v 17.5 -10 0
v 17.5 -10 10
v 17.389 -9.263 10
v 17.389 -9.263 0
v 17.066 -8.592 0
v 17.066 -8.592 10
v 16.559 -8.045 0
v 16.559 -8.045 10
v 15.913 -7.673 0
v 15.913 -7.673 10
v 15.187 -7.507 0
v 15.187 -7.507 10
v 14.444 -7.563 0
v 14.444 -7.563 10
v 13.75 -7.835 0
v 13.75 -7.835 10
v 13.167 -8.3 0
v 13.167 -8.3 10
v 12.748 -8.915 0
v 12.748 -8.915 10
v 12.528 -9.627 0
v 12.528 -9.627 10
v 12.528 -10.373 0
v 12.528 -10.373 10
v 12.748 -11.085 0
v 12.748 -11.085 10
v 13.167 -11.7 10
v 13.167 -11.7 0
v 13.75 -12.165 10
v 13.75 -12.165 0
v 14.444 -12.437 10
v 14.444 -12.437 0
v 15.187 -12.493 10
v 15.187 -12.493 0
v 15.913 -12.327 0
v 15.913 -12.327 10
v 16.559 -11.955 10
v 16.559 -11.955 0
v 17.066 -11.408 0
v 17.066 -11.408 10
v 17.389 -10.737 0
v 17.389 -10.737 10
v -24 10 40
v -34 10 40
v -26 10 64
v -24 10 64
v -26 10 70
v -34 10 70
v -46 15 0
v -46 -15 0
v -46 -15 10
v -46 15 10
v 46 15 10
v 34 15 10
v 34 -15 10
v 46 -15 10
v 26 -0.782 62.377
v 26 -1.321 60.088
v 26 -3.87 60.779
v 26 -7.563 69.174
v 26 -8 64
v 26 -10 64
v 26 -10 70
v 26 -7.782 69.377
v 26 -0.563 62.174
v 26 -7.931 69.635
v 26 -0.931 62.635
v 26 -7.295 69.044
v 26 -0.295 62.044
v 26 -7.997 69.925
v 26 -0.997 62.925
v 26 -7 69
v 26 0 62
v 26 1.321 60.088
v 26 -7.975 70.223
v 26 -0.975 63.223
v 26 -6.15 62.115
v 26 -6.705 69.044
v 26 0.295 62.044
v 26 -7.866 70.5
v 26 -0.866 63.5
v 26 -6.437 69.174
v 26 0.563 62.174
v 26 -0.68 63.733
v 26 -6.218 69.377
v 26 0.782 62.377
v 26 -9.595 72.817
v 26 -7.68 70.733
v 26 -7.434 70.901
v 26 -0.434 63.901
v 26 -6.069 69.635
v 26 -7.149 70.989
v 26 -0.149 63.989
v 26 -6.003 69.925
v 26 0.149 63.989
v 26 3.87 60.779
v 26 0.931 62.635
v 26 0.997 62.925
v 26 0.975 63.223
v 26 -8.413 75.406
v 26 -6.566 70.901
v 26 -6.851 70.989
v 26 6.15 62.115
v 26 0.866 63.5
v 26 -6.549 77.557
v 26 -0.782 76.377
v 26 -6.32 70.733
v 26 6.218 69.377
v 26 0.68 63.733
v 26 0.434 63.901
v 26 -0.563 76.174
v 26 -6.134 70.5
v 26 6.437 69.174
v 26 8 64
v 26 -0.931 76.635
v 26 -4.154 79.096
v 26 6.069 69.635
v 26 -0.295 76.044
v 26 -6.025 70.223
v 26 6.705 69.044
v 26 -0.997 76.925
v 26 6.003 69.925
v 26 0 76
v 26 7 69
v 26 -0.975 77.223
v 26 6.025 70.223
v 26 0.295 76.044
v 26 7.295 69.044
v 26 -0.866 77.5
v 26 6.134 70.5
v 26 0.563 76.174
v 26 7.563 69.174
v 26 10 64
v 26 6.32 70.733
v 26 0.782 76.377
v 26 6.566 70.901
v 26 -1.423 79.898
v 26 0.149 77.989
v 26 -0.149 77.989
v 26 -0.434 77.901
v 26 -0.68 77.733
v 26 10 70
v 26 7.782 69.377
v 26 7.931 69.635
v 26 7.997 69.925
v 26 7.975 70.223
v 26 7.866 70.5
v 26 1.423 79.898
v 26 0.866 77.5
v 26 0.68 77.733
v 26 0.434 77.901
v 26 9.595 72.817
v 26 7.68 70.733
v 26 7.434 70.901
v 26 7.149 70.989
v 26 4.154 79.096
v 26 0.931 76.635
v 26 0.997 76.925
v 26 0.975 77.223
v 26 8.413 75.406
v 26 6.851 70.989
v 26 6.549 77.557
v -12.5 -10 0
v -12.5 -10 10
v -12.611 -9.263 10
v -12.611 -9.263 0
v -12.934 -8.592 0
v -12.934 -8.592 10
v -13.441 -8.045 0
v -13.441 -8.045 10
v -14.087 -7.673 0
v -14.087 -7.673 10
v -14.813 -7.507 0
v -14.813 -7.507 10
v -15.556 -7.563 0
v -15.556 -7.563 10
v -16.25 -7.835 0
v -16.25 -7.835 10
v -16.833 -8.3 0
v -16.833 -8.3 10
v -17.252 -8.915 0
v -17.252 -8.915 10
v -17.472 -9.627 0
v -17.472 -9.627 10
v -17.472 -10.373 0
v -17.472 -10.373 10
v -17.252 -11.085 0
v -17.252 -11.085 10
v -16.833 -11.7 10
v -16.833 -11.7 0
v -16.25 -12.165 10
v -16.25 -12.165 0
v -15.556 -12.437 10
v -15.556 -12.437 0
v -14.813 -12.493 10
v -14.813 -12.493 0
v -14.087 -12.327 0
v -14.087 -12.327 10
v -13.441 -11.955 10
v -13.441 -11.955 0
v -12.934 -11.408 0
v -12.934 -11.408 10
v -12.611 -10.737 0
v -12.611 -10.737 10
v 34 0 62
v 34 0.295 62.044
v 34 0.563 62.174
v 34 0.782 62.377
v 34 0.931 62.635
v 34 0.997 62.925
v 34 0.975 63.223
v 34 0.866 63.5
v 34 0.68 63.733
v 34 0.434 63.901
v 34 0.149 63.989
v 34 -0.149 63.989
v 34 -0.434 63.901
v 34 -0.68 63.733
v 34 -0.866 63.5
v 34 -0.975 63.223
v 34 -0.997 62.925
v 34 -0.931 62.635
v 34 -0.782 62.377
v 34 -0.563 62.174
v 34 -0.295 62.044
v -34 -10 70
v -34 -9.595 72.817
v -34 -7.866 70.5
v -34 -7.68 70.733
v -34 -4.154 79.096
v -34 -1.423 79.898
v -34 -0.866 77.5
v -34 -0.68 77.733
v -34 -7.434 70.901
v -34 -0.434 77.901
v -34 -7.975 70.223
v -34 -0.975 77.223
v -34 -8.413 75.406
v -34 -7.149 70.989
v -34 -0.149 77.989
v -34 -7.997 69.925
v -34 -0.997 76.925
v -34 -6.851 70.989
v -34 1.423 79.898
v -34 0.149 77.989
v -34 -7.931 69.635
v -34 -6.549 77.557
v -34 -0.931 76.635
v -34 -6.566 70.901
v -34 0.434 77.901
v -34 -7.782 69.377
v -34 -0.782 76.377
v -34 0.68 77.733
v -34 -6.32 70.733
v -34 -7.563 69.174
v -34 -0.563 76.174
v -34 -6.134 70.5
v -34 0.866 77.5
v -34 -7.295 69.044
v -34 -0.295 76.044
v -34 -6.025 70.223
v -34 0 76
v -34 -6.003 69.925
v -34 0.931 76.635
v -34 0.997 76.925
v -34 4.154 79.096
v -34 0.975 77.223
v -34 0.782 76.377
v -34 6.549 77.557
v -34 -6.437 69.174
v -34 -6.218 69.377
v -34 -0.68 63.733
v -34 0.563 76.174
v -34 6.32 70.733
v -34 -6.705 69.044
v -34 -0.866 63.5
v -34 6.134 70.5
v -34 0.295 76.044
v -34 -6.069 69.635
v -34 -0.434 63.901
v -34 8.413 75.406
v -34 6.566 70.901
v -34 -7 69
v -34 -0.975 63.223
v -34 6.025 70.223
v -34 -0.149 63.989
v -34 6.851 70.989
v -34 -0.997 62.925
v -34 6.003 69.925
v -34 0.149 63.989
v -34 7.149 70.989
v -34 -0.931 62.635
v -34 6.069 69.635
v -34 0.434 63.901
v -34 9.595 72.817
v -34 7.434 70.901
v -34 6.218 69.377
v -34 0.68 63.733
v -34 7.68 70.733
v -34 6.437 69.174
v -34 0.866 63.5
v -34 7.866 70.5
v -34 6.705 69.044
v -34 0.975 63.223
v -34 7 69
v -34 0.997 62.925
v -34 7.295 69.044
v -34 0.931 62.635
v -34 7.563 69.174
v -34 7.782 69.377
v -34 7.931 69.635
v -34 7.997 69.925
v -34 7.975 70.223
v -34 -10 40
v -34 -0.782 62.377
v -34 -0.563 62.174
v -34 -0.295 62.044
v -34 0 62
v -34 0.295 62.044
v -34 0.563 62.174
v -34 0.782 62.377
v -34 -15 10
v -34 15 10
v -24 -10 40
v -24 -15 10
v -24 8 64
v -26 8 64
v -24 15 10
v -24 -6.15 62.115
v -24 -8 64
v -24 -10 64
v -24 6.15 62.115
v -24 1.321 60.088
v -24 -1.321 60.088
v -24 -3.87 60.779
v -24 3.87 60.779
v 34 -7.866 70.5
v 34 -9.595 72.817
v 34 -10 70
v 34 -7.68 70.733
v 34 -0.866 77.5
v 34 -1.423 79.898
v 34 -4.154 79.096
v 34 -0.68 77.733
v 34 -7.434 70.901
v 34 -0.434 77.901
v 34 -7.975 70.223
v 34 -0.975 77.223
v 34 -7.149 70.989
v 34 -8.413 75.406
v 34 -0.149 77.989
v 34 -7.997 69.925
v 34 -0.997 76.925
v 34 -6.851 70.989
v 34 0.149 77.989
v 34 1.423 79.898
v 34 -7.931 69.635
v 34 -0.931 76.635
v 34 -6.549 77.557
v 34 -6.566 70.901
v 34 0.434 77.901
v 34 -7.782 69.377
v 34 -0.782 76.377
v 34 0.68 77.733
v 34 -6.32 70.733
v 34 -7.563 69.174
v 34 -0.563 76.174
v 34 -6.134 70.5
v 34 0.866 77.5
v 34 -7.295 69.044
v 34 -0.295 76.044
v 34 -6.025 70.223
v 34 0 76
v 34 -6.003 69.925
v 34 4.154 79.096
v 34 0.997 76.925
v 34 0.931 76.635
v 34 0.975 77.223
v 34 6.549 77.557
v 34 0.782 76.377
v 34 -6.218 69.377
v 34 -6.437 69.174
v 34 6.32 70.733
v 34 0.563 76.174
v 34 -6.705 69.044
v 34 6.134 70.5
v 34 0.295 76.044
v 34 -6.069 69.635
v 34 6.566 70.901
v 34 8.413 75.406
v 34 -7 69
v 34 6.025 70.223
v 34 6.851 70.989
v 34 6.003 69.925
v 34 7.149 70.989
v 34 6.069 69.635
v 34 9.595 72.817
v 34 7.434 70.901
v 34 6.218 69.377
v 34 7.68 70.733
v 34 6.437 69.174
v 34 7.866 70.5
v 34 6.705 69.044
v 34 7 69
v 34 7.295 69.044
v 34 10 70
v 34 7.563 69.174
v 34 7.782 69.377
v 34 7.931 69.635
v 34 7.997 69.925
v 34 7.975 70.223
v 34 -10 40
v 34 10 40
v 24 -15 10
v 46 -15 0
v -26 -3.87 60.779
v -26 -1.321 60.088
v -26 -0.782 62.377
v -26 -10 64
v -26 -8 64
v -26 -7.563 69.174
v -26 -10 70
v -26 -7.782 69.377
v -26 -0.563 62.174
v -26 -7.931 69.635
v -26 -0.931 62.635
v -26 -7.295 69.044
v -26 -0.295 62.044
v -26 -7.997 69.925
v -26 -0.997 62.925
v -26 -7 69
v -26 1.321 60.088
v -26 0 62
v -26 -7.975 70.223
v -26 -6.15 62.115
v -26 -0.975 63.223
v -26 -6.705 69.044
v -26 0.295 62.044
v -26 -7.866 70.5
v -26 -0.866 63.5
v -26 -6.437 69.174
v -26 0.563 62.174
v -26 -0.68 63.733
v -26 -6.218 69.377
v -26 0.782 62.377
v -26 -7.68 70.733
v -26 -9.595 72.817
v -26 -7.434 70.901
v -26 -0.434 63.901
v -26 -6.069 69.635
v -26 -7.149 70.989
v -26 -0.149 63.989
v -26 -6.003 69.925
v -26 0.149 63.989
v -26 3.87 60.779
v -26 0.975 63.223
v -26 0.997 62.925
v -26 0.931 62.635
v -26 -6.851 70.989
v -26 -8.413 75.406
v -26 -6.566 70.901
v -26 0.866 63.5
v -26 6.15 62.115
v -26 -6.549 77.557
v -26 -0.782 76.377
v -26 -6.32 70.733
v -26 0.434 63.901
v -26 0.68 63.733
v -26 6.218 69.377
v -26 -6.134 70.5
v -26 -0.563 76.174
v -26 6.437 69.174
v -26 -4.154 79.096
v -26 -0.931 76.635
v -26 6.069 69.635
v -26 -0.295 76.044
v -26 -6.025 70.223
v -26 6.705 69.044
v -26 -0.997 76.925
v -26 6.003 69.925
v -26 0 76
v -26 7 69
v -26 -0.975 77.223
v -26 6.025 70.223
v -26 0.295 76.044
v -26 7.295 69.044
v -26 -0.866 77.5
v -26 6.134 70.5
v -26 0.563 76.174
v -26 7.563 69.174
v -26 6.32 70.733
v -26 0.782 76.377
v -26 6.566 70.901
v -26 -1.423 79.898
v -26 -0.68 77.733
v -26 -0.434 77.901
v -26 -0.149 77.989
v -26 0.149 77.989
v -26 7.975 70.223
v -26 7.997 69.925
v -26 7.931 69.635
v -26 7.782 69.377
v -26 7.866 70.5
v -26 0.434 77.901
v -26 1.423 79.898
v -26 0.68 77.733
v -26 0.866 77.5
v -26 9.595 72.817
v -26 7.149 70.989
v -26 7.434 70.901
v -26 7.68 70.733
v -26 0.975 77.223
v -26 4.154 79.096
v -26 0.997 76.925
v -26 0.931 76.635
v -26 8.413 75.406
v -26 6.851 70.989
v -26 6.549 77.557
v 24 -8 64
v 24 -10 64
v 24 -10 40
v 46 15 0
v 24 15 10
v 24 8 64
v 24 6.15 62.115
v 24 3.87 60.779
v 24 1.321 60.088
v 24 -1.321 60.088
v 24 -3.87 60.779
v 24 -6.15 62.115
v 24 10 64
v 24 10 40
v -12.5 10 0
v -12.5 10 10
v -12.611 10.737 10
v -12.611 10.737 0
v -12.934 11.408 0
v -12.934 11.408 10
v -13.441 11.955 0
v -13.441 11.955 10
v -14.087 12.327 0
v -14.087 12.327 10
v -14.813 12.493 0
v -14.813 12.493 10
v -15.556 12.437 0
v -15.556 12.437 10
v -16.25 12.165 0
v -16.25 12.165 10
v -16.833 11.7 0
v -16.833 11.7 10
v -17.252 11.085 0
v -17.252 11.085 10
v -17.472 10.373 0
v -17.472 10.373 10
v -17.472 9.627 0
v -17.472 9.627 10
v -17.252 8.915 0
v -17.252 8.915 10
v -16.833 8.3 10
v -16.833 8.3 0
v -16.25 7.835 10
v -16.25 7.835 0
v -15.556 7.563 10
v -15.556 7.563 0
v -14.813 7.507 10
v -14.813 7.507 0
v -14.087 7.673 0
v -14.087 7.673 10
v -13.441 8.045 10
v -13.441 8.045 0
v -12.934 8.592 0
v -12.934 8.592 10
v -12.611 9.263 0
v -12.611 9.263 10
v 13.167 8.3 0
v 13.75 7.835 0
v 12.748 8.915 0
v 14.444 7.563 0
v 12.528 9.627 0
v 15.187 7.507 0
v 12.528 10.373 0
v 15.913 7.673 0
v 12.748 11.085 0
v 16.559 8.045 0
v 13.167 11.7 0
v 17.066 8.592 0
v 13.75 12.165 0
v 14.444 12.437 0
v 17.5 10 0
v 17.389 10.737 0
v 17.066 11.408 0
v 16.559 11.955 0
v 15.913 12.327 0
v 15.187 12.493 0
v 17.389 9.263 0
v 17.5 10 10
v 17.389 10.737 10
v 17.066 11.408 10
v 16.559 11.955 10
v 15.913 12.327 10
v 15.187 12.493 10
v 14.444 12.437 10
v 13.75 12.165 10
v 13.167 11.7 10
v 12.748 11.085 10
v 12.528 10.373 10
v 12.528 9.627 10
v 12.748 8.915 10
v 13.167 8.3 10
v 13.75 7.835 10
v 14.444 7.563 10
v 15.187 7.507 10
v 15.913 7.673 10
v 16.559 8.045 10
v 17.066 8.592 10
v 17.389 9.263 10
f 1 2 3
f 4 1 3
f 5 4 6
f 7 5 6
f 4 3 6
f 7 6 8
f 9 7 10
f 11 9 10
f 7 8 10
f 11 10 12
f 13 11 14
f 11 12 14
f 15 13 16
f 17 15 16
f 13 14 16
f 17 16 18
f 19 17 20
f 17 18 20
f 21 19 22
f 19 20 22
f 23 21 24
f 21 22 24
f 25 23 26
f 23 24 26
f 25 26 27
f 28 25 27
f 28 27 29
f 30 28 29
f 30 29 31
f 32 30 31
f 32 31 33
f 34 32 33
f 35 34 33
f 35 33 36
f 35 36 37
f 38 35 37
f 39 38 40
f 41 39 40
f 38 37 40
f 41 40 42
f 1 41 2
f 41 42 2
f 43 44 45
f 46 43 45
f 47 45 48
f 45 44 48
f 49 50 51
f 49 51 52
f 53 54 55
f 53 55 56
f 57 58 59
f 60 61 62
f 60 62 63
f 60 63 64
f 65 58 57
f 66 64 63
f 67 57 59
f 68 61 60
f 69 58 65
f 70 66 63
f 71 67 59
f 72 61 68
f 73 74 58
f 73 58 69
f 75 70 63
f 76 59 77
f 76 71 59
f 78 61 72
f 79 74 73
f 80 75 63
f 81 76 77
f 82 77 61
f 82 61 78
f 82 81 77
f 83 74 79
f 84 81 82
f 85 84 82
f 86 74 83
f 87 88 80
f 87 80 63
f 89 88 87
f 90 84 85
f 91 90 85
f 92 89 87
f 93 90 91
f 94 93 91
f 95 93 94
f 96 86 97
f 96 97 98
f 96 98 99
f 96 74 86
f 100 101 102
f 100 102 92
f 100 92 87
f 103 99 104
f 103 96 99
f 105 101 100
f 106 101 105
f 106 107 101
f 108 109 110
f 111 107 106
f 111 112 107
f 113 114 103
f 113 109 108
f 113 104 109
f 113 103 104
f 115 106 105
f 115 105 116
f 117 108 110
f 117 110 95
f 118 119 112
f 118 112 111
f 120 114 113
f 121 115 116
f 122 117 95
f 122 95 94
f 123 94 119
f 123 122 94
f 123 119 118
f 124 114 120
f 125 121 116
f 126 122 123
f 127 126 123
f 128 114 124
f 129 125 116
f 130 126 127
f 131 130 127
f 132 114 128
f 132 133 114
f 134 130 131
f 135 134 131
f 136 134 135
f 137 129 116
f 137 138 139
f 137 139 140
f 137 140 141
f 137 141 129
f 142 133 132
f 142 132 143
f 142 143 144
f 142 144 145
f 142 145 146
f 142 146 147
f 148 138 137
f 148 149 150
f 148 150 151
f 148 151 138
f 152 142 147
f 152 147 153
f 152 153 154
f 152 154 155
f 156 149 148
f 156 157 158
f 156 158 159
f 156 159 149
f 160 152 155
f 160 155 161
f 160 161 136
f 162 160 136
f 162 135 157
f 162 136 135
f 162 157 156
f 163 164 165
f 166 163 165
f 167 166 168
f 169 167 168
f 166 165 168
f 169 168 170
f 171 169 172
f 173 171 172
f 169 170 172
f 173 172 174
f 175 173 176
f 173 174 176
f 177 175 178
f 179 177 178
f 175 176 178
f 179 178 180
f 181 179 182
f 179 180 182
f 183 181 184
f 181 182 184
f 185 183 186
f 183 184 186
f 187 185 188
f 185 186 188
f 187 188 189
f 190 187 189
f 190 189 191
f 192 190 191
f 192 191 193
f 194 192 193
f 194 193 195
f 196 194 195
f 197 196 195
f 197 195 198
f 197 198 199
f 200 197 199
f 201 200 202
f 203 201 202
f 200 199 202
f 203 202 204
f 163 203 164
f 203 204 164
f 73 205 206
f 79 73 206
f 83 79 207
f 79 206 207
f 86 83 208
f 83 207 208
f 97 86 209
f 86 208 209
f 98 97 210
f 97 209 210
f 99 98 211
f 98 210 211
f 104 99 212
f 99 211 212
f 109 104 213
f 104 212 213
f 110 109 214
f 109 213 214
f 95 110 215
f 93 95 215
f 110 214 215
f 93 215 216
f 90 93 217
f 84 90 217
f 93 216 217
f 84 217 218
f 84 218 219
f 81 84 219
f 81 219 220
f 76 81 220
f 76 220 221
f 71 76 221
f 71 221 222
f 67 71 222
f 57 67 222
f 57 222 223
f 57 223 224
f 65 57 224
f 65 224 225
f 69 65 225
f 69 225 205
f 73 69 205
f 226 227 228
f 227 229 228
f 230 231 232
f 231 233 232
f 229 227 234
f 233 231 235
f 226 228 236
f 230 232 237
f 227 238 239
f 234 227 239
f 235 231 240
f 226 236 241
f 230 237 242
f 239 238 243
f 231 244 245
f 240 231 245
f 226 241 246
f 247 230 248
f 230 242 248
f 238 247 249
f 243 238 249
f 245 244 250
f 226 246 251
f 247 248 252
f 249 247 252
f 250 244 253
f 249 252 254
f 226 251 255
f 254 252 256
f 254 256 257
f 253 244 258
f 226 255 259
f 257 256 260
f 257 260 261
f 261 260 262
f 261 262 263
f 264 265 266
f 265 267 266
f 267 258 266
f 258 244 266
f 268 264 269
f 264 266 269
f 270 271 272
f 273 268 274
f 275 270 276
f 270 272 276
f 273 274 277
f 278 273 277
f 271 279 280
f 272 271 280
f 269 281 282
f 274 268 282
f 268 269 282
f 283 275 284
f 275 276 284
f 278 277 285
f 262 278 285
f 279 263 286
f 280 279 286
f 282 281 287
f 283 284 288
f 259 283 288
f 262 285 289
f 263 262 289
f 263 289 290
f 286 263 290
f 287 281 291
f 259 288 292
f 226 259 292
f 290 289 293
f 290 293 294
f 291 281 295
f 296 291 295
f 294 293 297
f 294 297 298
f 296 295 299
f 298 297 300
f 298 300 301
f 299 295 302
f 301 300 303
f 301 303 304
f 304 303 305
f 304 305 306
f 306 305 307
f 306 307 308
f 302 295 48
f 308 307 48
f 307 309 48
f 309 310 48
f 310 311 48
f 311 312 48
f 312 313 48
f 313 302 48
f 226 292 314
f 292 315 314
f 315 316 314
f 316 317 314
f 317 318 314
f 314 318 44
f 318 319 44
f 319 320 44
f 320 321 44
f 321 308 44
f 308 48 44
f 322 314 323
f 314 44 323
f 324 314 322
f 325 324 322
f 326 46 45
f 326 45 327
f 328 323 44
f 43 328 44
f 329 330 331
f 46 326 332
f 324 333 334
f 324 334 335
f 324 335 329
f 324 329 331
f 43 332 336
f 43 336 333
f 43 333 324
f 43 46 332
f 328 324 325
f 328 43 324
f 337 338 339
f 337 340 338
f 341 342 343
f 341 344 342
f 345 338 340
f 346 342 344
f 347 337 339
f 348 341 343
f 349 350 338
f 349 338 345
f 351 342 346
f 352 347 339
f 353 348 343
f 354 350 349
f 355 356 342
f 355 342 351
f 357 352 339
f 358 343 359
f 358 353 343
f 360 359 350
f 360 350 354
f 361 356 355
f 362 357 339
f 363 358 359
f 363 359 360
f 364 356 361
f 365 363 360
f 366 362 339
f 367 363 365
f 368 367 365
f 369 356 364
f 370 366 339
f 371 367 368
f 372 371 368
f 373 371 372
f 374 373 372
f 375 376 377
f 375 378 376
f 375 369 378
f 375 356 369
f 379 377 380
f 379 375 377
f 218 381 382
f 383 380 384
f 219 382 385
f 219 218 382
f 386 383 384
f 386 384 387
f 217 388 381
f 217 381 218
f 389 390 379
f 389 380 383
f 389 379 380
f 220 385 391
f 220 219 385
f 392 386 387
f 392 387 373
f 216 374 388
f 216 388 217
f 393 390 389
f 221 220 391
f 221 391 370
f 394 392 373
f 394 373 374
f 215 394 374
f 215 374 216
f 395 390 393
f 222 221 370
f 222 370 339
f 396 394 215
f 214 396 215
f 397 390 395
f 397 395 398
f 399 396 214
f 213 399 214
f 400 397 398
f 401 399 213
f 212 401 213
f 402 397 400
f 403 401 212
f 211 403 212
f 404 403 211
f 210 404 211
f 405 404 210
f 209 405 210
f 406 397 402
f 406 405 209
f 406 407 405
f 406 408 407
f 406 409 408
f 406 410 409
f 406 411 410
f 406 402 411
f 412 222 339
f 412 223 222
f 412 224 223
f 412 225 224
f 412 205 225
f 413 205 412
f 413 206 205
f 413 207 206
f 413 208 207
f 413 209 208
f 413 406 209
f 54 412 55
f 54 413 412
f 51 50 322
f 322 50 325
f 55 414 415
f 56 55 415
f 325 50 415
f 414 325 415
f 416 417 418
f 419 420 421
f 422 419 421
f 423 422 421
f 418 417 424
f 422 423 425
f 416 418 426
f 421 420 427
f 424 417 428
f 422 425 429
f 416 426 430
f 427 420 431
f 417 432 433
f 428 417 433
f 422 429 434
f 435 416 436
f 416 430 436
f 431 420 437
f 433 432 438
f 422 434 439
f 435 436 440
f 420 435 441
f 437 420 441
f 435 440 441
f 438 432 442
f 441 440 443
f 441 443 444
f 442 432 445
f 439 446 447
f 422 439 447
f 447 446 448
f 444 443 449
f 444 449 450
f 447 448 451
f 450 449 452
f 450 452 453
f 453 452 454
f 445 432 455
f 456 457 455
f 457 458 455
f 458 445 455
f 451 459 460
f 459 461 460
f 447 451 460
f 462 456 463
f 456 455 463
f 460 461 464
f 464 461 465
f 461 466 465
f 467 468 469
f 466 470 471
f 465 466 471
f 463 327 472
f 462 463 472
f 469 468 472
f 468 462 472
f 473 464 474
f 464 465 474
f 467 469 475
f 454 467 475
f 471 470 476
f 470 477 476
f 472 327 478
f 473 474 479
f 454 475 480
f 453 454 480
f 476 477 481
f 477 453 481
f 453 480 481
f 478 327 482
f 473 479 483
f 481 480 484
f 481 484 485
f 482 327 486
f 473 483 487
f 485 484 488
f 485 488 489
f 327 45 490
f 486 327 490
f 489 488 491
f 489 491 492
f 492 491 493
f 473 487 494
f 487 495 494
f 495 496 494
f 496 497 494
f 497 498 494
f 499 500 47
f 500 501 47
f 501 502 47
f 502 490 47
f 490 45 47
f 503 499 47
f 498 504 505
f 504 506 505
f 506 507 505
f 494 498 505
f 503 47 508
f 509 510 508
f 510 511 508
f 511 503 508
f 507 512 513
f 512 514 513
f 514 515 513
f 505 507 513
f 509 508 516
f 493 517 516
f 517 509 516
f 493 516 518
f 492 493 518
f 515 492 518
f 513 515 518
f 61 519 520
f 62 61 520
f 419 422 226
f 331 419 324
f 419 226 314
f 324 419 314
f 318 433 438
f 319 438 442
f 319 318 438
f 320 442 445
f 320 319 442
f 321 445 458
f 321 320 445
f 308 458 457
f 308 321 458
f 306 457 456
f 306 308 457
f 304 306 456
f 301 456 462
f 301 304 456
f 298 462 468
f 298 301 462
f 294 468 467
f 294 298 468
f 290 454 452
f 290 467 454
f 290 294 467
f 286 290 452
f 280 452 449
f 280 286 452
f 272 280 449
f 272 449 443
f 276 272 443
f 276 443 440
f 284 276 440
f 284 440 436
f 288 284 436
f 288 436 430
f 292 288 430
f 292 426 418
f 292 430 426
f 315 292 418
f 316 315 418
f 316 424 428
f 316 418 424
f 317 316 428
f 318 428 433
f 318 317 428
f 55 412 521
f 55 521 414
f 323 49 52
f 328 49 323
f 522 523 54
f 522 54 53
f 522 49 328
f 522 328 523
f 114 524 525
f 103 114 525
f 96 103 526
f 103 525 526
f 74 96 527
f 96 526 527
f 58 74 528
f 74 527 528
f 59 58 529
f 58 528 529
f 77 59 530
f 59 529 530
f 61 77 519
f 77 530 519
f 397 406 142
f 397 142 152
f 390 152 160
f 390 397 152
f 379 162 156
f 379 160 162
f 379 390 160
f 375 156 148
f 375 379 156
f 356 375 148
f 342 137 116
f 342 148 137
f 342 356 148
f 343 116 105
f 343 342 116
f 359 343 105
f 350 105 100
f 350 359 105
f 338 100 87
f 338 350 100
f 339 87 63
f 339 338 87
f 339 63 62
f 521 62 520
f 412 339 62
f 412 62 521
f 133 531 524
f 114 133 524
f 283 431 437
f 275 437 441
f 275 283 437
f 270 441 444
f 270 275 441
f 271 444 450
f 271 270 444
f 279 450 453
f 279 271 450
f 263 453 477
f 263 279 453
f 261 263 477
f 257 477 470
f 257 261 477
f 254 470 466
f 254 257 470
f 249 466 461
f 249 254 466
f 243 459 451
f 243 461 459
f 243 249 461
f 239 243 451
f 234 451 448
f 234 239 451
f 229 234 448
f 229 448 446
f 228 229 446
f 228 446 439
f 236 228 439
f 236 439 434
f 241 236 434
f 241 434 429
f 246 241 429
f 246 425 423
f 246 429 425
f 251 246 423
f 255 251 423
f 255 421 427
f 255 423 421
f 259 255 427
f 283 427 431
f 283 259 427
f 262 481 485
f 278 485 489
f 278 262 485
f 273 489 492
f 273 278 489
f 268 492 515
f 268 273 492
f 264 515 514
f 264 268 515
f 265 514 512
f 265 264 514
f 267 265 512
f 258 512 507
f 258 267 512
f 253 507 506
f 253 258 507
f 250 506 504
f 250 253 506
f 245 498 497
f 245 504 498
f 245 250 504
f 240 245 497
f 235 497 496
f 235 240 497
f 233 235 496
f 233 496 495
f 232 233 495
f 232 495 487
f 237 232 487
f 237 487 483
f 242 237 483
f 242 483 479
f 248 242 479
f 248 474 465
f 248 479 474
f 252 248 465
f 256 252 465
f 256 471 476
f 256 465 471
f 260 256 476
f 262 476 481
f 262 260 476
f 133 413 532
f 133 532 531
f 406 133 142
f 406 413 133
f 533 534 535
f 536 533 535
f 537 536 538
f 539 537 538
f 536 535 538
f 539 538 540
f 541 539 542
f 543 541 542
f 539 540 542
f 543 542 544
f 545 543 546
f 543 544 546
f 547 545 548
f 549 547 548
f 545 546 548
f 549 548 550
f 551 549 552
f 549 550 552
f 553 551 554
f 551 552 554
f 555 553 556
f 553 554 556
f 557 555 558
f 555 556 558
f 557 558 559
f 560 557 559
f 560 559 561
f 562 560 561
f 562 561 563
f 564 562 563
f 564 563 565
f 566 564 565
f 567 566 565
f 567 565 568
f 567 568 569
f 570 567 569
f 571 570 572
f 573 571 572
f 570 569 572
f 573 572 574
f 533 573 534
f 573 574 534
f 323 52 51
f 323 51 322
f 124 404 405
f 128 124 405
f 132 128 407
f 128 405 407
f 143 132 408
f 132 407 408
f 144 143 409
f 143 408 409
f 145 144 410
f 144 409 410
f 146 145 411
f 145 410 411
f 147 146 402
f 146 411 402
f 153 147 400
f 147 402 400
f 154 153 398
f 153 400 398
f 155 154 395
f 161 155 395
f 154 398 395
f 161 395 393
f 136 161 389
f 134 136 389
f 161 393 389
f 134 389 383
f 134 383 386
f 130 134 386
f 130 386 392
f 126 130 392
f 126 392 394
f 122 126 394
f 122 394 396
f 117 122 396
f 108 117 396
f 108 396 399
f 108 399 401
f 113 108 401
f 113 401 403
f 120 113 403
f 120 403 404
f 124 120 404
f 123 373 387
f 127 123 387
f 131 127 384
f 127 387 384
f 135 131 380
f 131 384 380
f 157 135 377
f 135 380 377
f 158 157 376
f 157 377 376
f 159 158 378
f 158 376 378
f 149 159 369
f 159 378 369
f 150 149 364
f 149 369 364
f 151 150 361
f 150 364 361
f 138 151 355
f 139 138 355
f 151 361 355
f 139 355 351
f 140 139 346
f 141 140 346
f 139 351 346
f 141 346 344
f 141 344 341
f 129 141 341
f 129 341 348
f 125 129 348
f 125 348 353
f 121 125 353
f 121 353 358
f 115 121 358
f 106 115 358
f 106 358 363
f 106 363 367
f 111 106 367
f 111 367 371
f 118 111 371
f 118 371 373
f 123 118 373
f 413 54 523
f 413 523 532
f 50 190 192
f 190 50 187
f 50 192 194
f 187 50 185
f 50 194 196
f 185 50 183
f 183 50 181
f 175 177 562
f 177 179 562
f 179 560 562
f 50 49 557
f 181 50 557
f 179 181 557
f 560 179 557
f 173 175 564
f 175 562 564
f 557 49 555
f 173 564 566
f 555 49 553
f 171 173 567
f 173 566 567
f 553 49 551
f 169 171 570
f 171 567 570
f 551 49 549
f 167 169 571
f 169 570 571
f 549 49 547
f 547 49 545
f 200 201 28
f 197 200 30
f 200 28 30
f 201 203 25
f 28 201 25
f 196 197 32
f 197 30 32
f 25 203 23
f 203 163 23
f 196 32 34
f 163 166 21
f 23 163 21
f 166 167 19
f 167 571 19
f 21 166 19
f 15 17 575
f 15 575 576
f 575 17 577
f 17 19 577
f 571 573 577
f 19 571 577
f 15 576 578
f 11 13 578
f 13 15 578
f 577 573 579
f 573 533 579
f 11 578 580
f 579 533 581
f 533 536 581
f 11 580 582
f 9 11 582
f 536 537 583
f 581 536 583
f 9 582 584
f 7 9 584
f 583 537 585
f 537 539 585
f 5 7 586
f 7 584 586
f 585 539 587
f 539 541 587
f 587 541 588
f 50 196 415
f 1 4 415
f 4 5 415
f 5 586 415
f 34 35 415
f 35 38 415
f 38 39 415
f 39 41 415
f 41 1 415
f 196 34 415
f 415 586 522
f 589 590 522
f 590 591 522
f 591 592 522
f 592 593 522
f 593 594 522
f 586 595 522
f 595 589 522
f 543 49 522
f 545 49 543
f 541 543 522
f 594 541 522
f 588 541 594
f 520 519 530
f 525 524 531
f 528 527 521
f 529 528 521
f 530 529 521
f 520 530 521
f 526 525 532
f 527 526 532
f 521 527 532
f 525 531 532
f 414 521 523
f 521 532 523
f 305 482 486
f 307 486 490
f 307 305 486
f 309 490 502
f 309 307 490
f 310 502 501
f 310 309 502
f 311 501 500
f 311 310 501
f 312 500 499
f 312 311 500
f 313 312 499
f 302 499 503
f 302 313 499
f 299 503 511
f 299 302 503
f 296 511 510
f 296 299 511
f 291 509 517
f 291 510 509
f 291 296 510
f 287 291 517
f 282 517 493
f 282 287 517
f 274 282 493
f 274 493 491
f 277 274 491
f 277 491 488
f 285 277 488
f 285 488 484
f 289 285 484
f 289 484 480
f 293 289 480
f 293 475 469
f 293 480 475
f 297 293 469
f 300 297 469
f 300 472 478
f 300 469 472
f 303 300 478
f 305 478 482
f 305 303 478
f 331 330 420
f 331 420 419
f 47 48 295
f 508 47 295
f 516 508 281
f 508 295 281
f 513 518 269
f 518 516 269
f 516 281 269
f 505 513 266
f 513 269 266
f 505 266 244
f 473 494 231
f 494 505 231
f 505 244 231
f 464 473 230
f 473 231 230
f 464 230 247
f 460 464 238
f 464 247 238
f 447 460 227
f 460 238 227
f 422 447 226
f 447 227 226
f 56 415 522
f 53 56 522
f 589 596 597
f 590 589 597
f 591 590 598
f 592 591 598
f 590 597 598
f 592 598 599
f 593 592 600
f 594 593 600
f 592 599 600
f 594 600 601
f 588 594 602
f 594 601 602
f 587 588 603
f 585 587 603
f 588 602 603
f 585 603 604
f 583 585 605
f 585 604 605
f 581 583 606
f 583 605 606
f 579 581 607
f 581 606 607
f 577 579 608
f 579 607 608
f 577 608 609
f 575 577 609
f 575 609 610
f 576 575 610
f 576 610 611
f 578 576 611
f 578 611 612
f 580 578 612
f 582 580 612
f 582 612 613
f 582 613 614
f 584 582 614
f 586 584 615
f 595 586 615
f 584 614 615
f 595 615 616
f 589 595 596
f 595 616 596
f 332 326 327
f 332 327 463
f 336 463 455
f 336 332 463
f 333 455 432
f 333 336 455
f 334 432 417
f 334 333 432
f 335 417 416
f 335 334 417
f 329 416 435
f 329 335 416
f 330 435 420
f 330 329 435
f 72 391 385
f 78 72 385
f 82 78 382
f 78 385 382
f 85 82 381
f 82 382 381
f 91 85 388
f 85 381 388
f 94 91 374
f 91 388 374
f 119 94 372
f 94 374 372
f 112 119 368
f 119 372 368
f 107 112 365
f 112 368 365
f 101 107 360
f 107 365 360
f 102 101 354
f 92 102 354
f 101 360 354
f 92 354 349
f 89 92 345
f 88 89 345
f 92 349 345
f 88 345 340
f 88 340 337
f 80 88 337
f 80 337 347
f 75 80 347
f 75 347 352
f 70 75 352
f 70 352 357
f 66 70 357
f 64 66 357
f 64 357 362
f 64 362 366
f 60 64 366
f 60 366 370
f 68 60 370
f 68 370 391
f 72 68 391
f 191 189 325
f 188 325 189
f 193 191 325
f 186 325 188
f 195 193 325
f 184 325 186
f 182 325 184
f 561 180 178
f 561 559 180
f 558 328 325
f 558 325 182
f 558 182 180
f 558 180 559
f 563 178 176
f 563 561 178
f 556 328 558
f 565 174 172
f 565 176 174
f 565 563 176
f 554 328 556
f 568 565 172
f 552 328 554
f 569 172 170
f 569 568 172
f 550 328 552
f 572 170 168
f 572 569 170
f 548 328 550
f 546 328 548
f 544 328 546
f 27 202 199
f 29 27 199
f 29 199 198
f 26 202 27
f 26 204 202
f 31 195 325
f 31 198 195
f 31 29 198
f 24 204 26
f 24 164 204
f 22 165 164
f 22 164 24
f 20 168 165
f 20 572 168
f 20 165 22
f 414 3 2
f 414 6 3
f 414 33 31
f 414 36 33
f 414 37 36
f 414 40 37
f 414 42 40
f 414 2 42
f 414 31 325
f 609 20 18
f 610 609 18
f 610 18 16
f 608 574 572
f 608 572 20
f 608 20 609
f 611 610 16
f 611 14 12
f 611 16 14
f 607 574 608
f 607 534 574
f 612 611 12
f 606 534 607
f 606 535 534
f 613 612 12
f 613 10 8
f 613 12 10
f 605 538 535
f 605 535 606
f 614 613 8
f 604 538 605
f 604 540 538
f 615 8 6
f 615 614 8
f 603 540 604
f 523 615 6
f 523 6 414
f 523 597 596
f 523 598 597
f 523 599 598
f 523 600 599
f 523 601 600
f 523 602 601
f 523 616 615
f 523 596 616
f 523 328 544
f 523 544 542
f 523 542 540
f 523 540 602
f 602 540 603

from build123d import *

# Parameters (mm, degrees)
SKETCH1_W           = 92
SKETCH1_H           = 30
BOSS_EXTRUDE1_DEPTH = 10
BOSS_EXTRUDE2_START = -12
BOSS_EXTRUDE2_DEPTH = 10
SKETCH3_R           = 1
CUT_EXTRUDE1_DEPTH  = 10
CUT_EXTRUDE2_DEPTH  = 2
SKETCH7_R           = 2.5
CUT_EXTRUDE3_DEPTH  = 10


with BuildPart() as part:
    # Sketch1 → Boss-Extrude1 (new body)
    with BuildSketch(Plane.XY):
        Rectangle(SKETCH1_W, SKETCH1_H)
    extrude(amount=BOSS_EXTRUDE1_DEPTH)

    # Sketch2 → Boss-Extrude2 (add)
    with BuildSketch(Plane(origin=(46, 0, 0), x_dir=(0, 0, -1), z_dir=(1, 0, 0)).offset(BOSS_EXTRUDE2_START)):
        with BuildLine():
            Line((-10, -15), (-10, 15))
            Line((-10, 15), (-40, 10))
            Line((-40, 10), (-70, 10))
            ThreePointArc((-70, 10), (-62.928932188, 7.071067812), (-60, 0))
            ThreePointArc((-60, 0), (-62.928932188, -7.071067812), (-70, -10))
            Line((-70, -10), (-40, -10))
            Line((-40, -10), (-10, -15))
        make_face()
        with BuildLine():
            ThreePointArc((-60, 0), (-62.928932188, 7.071067812), (-70, 10))
            Line((-70, 10), (-70, -10))
            ThreePointArc((-70, -10), (-62.928932188, -7.071067812), (-60, 0))
        make_face()
        with BuildLine():
            Line((-70, -10), (-70, 10))
            ThreePointArc((-70, 10), (-80, 0), (-70, -10))
        make_face()
    boss_extrude2 = extrude(amount=-BOSS_EXTRUDE2_DEPTH)

    # Sketch3 → Cut-Extrude1 (cut)
    with BuildSketch(Plane(origin=(34, 0, 0), x_dir=(0, 0, -1), z_dir=(1, 0, 0))):
        with Locations((-70, 7)):
            Circle(SKETCH3_R)
        with Locations((-63, 0)):
            Circle(SKETCH3_R)
        with Locations((-70, -7)):
            Circle(SKETCH3_R)
        with Locations((-77, 0)):
            Circle(SKETCH3_R)
    cut_extrude1 = extrude(amount=-CUT_EXTRUDE1_DEPTH, mode=Mode.SUBTRACT)

    # Mirror1: Boss-Extrude2, Cut-Extrude1 across plane
    add(boss_extrude2.mirror(Plane(origin=(0, 0, 0), x_dir=(0, 0, 1), z_dir=(1, 0, 0))))
    add(cut_extrude1.mirror(Plane(origin=(0, 0, 0), x_dir=(0, 0, 1), z_dir=(1, 0, 0))), mode=Mode.SUBTRACT)

    # Sketch6 → Cut-Extrude2 (cut)
    with BuildSketch(Plane.ZY.offset(-24)):
        with BuildLine():
            Line((70, 10), (64, 10))
            Line((64, 10), (64, 8))
            ThreePointArc((64, 8), (60, 0), (64, -8))
            Line((64, -8), (64, -10))
            Line((64, -10), (70, -10))
            ThreePointArc((70, -10), (80, 0), (70, 10))
        make_face()
    cut_extrude2 = extrude(amount=-CUT_EXTRUDE2_DEPTH, mode=Mode.SUBTRACT)

    # Mirror2: Cut-Extrude2 across plane
    add(cut_extrude2.mirror(Plane(origin=(0, 0, 0), x_dir=(0, 0, 1), z_dir=(1, 0, 0))), mode=Mode.SUBTRACT)

    # Sketch7 → Cut-Extrude3 (cut)
    with BuildSketch(Plane.XY.offset(10)):
        with Locations((-15, 10)):
            Circle(SKETCH7_R)
        with Locations((15, 10)):
            Circle(SKETCH7_R)
        with Locations((-15, -10)):
            Circle(SKETCH7_R)
        with Locations((15, -10)):
            Circle(SKETCH7_R)
    extrude(amount=-CUT_EXTRUDE3_DEPTH, mode=Mode.SUBTRACT)


solid = part.part
